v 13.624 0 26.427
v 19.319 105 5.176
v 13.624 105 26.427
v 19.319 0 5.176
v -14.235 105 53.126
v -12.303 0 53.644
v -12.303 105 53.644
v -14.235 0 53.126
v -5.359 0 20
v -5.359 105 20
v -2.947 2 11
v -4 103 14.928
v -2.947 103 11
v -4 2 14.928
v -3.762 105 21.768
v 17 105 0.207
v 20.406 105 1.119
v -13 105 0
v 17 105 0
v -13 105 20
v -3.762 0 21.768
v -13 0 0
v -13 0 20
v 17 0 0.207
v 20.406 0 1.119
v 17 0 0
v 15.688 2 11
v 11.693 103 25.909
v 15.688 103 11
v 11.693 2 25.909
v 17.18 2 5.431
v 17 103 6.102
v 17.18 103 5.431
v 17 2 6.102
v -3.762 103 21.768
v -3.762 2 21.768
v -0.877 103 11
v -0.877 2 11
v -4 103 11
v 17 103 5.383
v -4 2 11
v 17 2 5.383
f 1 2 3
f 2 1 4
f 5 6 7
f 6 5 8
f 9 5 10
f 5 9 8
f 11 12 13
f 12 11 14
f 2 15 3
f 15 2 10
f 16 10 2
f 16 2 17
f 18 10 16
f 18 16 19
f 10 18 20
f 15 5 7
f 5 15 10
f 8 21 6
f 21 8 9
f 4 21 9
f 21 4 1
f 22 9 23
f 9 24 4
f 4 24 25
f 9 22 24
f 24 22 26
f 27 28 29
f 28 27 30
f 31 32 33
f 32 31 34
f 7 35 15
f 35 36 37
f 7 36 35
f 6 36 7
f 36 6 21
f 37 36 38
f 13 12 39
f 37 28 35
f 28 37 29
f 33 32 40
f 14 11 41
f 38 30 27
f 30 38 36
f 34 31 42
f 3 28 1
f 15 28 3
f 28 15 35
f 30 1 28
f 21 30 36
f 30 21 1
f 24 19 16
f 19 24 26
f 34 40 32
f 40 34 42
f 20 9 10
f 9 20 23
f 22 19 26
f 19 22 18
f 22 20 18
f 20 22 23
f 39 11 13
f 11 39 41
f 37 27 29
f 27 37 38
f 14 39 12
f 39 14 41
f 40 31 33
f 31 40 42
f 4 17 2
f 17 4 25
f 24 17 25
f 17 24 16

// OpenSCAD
rotate([0,-15,0])
difference()
{
  cube([20,105,55]);
  translate([2,2,-2]) cube([16,101,60]);
  translate([2,-2,22]) cube([25,110,60]);
}
difference()
{
  translate([-13,0,0]) cube([30,105,20]);
  translate([-4,2,11]) cube([20,101,60]);
  translate([-2,-2,11]) cube([25,110,60]);
}
rotate([0,-15,0]) translate([16,0,-4.2]) cube([4,105,5]);
